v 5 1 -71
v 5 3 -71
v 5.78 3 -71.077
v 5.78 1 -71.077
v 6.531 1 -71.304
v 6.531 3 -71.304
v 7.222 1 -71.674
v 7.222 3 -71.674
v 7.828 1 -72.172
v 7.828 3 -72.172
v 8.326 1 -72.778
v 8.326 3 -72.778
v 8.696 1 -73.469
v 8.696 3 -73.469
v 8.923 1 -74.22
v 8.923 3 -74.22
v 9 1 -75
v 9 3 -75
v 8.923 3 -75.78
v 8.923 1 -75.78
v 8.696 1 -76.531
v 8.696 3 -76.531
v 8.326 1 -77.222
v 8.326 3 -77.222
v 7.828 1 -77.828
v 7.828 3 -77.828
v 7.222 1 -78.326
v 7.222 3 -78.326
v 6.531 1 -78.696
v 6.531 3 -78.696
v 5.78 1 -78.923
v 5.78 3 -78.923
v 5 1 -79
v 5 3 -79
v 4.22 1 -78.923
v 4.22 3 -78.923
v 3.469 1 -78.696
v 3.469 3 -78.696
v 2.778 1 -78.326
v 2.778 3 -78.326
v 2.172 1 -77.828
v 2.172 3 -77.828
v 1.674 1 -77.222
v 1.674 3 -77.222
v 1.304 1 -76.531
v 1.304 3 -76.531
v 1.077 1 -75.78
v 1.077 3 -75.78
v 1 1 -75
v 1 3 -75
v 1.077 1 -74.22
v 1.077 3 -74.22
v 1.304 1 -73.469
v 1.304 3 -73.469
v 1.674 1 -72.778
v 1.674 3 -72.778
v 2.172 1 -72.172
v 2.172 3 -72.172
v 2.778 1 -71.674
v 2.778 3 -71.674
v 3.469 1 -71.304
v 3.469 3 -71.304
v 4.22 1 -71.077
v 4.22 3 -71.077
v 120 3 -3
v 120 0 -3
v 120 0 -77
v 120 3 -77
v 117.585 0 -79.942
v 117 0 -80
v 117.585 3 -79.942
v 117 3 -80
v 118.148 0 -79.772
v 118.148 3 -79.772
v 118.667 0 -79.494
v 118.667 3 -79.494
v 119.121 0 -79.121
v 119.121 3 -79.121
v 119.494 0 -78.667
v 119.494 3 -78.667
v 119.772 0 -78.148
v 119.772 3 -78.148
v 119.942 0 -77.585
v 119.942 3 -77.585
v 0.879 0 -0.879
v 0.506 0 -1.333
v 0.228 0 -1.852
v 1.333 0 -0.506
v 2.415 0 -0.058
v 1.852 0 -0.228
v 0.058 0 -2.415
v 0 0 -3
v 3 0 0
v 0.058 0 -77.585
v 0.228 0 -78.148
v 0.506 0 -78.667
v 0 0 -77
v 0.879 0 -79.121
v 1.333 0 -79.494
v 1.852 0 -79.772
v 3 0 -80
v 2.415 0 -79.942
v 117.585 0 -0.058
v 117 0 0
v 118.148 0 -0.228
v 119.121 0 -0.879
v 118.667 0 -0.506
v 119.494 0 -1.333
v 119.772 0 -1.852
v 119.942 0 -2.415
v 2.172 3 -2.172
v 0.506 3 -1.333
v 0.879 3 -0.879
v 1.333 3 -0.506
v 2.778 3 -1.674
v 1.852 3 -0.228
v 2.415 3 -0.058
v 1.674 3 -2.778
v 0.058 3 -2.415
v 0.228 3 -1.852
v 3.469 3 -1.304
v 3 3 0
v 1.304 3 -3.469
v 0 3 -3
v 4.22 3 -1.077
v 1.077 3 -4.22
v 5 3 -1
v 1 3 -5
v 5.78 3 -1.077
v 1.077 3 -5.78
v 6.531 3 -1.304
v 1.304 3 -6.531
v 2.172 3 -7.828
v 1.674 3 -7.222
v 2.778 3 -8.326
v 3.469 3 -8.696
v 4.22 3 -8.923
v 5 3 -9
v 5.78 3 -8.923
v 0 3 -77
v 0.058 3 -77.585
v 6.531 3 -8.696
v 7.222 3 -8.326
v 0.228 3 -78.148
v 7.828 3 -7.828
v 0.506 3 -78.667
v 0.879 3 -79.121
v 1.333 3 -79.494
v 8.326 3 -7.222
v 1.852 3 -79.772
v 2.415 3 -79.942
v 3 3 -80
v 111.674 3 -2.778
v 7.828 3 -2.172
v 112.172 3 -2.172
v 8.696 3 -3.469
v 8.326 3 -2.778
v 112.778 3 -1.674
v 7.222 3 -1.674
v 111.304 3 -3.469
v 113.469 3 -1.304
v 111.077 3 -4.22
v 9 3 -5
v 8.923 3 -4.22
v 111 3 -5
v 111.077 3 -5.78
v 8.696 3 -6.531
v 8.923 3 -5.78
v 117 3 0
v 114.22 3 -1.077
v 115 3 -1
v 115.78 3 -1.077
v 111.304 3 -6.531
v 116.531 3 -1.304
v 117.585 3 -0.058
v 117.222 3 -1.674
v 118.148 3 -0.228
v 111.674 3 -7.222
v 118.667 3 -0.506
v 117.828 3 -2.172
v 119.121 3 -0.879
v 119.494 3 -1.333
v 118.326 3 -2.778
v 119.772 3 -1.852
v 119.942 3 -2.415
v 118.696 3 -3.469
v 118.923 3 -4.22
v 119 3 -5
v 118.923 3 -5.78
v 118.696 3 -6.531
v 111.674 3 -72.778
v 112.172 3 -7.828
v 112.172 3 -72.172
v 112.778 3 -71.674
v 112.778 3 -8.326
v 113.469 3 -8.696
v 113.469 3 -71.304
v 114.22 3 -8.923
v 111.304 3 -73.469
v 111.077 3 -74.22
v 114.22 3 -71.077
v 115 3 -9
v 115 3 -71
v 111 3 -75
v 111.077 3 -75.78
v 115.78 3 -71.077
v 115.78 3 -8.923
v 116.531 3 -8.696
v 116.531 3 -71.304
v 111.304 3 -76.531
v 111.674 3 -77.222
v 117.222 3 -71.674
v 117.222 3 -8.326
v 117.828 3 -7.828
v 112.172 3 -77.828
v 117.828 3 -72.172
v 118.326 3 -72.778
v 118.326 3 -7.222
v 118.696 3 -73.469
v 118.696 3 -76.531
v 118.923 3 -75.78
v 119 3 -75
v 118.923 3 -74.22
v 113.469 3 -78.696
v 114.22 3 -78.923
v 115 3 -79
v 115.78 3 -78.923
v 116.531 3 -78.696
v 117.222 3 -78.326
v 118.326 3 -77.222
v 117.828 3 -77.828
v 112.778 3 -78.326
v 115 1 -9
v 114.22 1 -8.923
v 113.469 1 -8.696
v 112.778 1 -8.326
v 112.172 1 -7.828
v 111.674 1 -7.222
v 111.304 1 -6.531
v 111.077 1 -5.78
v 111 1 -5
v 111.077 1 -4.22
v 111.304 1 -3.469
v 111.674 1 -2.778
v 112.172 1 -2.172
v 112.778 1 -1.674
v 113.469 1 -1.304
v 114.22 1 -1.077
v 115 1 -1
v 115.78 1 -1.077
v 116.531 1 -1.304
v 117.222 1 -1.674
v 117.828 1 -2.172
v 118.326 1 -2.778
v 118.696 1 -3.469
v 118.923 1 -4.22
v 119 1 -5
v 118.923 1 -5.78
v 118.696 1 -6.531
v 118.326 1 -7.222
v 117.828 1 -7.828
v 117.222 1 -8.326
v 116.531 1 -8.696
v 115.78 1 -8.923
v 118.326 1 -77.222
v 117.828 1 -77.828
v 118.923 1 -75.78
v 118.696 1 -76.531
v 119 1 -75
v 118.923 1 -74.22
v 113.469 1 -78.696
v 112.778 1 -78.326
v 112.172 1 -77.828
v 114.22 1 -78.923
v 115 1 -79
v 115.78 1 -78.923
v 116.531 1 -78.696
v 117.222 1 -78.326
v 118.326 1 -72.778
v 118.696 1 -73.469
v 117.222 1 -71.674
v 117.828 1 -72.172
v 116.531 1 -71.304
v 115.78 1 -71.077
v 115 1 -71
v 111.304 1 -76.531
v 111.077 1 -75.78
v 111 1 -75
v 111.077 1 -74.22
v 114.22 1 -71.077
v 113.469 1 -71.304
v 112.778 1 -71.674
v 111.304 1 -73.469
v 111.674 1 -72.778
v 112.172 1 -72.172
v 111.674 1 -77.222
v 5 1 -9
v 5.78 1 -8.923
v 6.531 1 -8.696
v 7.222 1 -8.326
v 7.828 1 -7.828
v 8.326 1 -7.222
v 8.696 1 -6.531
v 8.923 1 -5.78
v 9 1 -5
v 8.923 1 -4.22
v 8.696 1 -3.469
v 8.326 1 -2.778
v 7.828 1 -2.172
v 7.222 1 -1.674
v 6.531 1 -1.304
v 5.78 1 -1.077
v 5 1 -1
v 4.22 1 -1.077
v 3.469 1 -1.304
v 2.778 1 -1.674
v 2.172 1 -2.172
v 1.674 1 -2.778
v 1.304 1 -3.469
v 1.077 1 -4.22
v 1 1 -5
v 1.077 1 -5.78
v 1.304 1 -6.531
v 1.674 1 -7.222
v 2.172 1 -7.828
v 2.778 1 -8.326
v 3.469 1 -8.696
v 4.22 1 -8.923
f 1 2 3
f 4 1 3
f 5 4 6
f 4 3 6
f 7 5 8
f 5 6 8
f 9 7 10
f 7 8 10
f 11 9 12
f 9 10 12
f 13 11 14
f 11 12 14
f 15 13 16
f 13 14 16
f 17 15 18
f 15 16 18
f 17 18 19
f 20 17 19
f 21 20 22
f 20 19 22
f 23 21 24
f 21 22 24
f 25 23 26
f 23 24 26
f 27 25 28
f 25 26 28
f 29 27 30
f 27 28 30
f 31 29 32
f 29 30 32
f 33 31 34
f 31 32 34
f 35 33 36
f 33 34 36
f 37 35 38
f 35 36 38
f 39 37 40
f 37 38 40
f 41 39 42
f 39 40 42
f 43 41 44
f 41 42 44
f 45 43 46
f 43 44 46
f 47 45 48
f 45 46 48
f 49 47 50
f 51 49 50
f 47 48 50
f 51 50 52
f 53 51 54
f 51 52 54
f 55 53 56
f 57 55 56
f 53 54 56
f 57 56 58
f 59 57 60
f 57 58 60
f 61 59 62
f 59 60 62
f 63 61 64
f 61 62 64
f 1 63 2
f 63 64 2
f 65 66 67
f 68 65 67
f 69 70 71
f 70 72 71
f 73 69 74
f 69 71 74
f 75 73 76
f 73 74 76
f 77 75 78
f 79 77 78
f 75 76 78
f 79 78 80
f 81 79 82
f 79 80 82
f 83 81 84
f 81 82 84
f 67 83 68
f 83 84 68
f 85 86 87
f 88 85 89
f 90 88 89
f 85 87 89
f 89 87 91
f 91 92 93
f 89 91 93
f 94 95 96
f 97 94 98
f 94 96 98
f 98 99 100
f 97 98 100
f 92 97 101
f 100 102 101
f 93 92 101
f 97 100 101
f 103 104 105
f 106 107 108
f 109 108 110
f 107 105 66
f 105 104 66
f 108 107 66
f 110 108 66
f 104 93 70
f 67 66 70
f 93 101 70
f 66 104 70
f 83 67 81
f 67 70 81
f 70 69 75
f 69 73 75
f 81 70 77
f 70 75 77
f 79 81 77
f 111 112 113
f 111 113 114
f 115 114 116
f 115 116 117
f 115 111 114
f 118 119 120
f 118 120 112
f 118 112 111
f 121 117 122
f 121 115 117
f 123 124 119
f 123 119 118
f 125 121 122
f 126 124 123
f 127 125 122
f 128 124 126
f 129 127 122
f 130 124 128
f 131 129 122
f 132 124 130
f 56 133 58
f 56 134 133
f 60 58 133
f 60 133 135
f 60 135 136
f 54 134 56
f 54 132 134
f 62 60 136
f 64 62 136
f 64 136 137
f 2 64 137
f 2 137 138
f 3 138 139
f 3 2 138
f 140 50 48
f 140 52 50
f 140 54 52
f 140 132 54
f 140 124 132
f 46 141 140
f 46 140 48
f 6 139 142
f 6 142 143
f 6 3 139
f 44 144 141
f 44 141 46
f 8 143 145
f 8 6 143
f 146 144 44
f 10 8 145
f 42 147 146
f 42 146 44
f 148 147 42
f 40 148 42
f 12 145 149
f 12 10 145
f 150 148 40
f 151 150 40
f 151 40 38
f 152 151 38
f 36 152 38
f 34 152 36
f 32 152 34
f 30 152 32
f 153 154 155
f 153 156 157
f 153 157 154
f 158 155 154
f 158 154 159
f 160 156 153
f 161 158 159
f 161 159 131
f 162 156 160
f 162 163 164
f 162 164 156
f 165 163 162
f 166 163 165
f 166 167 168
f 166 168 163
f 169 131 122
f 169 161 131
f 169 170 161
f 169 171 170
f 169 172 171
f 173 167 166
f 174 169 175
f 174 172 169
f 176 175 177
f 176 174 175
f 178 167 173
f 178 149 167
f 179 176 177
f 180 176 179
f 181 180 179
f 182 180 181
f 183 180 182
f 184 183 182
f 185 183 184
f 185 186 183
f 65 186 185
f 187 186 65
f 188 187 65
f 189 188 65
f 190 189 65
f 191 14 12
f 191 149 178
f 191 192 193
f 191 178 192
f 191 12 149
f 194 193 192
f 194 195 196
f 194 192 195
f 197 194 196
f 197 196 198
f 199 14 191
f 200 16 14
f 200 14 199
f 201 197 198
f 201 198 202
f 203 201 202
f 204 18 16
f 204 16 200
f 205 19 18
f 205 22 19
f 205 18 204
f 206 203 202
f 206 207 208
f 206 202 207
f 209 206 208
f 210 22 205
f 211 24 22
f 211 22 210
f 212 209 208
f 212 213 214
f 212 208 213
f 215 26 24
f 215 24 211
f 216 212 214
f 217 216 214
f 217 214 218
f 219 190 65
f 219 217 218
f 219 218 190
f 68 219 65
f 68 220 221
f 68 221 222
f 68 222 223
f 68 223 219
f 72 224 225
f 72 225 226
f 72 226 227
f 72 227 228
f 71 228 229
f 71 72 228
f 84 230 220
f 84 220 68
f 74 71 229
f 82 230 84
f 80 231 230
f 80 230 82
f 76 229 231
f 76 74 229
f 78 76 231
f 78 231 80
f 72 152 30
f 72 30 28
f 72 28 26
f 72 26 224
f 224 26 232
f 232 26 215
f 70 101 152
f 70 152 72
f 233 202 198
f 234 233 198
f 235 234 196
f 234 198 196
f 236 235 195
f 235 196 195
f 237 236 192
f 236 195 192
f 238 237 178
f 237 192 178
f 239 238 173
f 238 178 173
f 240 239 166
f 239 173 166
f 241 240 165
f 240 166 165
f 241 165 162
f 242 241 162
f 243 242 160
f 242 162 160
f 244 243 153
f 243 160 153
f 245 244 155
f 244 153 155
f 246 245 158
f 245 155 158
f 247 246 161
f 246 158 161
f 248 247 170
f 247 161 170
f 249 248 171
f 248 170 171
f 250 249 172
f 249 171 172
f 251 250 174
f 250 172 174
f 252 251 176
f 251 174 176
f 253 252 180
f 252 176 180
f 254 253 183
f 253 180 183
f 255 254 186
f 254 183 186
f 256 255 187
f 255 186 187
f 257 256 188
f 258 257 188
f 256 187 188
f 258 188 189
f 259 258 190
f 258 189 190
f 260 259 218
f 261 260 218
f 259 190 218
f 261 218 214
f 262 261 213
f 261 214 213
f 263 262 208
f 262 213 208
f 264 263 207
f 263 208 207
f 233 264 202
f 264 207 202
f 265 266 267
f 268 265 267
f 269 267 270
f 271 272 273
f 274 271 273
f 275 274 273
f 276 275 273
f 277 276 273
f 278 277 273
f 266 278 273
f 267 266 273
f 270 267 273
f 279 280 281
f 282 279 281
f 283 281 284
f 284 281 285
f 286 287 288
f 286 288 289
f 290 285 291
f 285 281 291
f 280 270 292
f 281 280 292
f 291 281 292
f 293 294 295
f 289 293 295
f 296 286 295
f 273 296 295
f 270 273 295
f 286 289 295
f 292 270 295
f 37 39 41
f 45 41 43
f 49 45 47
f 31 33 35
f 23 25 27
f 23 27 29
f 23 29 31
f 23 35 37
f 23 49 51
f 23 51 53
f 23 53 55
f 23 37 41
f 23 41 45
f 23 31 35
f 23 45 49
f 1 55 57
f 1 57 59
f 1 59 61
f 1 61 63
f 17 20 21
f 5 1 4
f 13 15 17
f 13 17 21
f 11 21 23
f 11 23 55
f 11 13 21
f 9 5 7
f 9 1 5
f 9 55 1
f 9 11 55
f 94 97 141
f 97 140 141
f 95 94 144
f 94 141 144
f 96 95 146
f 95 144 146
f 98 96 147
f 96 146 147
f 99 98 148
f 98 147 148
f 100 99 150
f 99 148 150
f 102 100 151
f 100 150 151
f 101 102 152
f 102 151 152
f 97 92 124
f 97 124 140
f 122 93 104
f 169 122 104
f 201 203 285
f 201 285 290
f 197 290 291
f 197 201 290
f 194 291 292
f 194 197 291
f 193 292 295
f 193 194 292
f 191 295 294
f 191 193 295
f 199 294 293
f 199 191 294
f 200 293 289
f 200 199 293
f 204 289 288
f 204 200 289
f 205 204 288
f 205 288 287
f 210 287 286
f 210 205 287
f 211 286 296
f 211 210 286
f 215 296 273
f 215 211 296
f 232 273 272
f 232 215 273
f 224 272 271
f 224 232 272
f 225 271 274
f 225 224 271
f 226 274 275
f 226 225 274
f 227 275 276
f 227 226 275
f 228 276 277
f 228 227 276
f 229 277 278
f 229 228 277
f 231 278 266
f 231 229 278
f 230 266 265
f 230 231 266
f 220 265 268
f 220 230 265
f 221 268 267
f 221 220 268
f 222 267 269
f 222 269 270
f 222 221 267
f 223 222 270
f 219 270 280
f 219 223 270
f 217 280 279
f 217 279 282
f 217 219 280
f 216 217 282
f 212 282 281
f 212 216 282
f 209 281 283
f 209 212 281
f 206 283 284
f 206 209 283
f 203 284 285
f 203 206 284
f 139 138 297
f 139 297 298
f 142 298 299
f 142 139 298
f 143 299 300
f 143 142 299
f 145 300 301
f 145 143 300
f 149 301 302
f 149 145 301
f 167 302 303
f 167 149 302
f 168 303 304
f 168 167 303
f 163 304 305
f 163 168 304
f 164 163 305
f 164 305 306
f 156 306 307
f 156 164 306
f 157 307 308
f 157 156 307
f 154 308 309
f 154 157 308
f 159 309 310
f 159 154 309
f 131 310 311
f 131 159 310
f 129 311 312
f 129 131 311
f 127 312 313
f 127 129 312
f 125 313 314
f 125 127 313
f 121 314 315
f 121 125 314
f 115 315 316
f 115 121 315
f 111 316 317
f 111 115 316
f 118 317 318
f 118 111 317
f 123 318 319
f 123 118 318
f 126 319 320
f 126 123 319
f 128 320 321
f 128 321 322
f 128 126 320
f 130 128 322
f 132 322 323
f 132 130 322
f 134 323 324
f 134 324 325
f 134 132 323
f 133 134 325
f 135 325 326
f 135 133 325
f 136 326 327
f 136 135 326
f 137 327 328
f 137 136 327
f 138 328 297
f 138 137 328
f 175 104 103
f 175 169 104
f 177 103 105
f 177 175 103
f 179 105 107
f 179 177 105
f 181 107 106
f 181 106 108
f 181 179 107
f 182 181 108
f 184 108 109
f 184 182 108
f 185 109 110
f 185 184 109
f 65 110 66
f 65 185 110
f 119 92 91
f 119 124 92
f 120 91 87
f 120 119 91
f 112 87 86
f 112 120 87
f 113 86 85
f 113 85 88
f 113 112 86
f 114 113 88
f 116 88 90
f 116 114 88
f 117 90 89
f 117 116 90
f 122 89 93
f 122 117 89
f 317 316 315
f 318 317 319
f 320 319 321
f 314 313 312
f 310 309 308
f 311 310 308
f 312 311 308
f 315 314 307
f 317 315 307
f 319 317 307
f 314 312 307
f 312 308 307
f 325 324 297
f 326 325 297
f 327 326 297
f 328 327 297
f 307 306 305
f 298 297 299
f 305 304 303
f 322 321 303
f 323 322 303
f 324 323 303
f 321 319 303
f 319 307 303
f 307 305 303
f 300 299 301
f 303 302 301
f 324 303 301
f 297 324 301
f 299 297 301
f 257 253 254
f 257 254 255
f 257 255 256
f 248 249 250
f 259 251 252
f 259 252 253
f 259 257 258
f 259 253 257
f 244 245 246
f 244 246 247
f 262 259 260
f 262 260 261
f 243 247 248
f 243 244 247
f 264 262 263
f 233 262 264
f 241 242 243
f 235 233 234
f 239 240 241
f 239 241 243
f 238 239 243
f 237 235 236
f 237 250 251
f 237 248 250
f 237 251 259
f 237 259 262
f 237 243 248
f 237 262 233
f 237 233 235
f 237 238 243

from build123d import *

# Parameters (mm, degrees)
SKETCH1_W               = 120
SKETCH1_H               = 80
BOSS_EXTRUDE1_DEPTH     = 3
SKETCH2_R               = 4
CUT_EXTRUDE1_DEPTH      = 2
MIRROR2_COPY_1_SKETCH_R = 4
MIRROR2_COPY_1_DEPTH    = 2
FILLET2_R               = 3


with BuildPart() as part:
    # Sketch1 → Boss-Extrude1 (new body)
    with BuildSketch(Plane(origin=(0, 0, 0), x_dir=(1, 0, 0), z_dir=(0, 1, 0))):
        with Locations((60, 40)):
            Rectangle(SKETCH1_W, SKETCH1_H)
    extrude(amount=BOSS_EXTRUDE1_DEPTH)

    # Sketch2 → Cut-Extrude1 (cut)
    with BuildSketch(Plane(origin=(0, 3, 0), x_dir=(1, 0, 0), z_dir=(0, 1, 0))):
        with Locations(Location((5, 75, 0), (0, 0, 270))):
            Circle(SKETCH2_R)
    cut_extrude1 = extrude(amount=-CUT_EXTRUDE1_DEPTH, mode=Mode.SUBTRACT)

    # Mirror1: Cut-Extrude1 across plane
    add(cut_extrude1.mirror(Plane(origin=(0, 0, -40), x_dir=(1, 0, 0), z_dir=(0, 0, -1))), mode=Mode.SUBTRACT)

    # Mirror2: Cut-Extrude1 across plane
    add(cut_extrude1.mirror(Plane.ZY.offset(-60)), mode=Mode.SUBTRACT)

    # Mirror2 copy 1 sketch → Mirror2 copy 1 (cut)
    with BuildSketch(Plane(origin=(120, 3, -80), x_dir=(-1, 0, 0), z_dir=(0, 1, 0))):
        with Locations(Location((5, 75, 0), (0, 0, 270))):
            Circle(MIRROR2_COPY_1_SKETCH_R)
    extrude(amount=-MIRROR2_COPY_1_DEPTH, mode=Mode.SUBTRACT)

    # Fillet2
    fillet2_edges = [part.edges().sort_by_distance(p)[0] for p in [
        (0, 1.5, -80),
        (120, 1.5, -80),
        (120, 1.5, 0),
        (0, 1.5, 0),
    ]]
    fillet(fillet2_edges, radius=FILLET2_R)


solid = part.part
